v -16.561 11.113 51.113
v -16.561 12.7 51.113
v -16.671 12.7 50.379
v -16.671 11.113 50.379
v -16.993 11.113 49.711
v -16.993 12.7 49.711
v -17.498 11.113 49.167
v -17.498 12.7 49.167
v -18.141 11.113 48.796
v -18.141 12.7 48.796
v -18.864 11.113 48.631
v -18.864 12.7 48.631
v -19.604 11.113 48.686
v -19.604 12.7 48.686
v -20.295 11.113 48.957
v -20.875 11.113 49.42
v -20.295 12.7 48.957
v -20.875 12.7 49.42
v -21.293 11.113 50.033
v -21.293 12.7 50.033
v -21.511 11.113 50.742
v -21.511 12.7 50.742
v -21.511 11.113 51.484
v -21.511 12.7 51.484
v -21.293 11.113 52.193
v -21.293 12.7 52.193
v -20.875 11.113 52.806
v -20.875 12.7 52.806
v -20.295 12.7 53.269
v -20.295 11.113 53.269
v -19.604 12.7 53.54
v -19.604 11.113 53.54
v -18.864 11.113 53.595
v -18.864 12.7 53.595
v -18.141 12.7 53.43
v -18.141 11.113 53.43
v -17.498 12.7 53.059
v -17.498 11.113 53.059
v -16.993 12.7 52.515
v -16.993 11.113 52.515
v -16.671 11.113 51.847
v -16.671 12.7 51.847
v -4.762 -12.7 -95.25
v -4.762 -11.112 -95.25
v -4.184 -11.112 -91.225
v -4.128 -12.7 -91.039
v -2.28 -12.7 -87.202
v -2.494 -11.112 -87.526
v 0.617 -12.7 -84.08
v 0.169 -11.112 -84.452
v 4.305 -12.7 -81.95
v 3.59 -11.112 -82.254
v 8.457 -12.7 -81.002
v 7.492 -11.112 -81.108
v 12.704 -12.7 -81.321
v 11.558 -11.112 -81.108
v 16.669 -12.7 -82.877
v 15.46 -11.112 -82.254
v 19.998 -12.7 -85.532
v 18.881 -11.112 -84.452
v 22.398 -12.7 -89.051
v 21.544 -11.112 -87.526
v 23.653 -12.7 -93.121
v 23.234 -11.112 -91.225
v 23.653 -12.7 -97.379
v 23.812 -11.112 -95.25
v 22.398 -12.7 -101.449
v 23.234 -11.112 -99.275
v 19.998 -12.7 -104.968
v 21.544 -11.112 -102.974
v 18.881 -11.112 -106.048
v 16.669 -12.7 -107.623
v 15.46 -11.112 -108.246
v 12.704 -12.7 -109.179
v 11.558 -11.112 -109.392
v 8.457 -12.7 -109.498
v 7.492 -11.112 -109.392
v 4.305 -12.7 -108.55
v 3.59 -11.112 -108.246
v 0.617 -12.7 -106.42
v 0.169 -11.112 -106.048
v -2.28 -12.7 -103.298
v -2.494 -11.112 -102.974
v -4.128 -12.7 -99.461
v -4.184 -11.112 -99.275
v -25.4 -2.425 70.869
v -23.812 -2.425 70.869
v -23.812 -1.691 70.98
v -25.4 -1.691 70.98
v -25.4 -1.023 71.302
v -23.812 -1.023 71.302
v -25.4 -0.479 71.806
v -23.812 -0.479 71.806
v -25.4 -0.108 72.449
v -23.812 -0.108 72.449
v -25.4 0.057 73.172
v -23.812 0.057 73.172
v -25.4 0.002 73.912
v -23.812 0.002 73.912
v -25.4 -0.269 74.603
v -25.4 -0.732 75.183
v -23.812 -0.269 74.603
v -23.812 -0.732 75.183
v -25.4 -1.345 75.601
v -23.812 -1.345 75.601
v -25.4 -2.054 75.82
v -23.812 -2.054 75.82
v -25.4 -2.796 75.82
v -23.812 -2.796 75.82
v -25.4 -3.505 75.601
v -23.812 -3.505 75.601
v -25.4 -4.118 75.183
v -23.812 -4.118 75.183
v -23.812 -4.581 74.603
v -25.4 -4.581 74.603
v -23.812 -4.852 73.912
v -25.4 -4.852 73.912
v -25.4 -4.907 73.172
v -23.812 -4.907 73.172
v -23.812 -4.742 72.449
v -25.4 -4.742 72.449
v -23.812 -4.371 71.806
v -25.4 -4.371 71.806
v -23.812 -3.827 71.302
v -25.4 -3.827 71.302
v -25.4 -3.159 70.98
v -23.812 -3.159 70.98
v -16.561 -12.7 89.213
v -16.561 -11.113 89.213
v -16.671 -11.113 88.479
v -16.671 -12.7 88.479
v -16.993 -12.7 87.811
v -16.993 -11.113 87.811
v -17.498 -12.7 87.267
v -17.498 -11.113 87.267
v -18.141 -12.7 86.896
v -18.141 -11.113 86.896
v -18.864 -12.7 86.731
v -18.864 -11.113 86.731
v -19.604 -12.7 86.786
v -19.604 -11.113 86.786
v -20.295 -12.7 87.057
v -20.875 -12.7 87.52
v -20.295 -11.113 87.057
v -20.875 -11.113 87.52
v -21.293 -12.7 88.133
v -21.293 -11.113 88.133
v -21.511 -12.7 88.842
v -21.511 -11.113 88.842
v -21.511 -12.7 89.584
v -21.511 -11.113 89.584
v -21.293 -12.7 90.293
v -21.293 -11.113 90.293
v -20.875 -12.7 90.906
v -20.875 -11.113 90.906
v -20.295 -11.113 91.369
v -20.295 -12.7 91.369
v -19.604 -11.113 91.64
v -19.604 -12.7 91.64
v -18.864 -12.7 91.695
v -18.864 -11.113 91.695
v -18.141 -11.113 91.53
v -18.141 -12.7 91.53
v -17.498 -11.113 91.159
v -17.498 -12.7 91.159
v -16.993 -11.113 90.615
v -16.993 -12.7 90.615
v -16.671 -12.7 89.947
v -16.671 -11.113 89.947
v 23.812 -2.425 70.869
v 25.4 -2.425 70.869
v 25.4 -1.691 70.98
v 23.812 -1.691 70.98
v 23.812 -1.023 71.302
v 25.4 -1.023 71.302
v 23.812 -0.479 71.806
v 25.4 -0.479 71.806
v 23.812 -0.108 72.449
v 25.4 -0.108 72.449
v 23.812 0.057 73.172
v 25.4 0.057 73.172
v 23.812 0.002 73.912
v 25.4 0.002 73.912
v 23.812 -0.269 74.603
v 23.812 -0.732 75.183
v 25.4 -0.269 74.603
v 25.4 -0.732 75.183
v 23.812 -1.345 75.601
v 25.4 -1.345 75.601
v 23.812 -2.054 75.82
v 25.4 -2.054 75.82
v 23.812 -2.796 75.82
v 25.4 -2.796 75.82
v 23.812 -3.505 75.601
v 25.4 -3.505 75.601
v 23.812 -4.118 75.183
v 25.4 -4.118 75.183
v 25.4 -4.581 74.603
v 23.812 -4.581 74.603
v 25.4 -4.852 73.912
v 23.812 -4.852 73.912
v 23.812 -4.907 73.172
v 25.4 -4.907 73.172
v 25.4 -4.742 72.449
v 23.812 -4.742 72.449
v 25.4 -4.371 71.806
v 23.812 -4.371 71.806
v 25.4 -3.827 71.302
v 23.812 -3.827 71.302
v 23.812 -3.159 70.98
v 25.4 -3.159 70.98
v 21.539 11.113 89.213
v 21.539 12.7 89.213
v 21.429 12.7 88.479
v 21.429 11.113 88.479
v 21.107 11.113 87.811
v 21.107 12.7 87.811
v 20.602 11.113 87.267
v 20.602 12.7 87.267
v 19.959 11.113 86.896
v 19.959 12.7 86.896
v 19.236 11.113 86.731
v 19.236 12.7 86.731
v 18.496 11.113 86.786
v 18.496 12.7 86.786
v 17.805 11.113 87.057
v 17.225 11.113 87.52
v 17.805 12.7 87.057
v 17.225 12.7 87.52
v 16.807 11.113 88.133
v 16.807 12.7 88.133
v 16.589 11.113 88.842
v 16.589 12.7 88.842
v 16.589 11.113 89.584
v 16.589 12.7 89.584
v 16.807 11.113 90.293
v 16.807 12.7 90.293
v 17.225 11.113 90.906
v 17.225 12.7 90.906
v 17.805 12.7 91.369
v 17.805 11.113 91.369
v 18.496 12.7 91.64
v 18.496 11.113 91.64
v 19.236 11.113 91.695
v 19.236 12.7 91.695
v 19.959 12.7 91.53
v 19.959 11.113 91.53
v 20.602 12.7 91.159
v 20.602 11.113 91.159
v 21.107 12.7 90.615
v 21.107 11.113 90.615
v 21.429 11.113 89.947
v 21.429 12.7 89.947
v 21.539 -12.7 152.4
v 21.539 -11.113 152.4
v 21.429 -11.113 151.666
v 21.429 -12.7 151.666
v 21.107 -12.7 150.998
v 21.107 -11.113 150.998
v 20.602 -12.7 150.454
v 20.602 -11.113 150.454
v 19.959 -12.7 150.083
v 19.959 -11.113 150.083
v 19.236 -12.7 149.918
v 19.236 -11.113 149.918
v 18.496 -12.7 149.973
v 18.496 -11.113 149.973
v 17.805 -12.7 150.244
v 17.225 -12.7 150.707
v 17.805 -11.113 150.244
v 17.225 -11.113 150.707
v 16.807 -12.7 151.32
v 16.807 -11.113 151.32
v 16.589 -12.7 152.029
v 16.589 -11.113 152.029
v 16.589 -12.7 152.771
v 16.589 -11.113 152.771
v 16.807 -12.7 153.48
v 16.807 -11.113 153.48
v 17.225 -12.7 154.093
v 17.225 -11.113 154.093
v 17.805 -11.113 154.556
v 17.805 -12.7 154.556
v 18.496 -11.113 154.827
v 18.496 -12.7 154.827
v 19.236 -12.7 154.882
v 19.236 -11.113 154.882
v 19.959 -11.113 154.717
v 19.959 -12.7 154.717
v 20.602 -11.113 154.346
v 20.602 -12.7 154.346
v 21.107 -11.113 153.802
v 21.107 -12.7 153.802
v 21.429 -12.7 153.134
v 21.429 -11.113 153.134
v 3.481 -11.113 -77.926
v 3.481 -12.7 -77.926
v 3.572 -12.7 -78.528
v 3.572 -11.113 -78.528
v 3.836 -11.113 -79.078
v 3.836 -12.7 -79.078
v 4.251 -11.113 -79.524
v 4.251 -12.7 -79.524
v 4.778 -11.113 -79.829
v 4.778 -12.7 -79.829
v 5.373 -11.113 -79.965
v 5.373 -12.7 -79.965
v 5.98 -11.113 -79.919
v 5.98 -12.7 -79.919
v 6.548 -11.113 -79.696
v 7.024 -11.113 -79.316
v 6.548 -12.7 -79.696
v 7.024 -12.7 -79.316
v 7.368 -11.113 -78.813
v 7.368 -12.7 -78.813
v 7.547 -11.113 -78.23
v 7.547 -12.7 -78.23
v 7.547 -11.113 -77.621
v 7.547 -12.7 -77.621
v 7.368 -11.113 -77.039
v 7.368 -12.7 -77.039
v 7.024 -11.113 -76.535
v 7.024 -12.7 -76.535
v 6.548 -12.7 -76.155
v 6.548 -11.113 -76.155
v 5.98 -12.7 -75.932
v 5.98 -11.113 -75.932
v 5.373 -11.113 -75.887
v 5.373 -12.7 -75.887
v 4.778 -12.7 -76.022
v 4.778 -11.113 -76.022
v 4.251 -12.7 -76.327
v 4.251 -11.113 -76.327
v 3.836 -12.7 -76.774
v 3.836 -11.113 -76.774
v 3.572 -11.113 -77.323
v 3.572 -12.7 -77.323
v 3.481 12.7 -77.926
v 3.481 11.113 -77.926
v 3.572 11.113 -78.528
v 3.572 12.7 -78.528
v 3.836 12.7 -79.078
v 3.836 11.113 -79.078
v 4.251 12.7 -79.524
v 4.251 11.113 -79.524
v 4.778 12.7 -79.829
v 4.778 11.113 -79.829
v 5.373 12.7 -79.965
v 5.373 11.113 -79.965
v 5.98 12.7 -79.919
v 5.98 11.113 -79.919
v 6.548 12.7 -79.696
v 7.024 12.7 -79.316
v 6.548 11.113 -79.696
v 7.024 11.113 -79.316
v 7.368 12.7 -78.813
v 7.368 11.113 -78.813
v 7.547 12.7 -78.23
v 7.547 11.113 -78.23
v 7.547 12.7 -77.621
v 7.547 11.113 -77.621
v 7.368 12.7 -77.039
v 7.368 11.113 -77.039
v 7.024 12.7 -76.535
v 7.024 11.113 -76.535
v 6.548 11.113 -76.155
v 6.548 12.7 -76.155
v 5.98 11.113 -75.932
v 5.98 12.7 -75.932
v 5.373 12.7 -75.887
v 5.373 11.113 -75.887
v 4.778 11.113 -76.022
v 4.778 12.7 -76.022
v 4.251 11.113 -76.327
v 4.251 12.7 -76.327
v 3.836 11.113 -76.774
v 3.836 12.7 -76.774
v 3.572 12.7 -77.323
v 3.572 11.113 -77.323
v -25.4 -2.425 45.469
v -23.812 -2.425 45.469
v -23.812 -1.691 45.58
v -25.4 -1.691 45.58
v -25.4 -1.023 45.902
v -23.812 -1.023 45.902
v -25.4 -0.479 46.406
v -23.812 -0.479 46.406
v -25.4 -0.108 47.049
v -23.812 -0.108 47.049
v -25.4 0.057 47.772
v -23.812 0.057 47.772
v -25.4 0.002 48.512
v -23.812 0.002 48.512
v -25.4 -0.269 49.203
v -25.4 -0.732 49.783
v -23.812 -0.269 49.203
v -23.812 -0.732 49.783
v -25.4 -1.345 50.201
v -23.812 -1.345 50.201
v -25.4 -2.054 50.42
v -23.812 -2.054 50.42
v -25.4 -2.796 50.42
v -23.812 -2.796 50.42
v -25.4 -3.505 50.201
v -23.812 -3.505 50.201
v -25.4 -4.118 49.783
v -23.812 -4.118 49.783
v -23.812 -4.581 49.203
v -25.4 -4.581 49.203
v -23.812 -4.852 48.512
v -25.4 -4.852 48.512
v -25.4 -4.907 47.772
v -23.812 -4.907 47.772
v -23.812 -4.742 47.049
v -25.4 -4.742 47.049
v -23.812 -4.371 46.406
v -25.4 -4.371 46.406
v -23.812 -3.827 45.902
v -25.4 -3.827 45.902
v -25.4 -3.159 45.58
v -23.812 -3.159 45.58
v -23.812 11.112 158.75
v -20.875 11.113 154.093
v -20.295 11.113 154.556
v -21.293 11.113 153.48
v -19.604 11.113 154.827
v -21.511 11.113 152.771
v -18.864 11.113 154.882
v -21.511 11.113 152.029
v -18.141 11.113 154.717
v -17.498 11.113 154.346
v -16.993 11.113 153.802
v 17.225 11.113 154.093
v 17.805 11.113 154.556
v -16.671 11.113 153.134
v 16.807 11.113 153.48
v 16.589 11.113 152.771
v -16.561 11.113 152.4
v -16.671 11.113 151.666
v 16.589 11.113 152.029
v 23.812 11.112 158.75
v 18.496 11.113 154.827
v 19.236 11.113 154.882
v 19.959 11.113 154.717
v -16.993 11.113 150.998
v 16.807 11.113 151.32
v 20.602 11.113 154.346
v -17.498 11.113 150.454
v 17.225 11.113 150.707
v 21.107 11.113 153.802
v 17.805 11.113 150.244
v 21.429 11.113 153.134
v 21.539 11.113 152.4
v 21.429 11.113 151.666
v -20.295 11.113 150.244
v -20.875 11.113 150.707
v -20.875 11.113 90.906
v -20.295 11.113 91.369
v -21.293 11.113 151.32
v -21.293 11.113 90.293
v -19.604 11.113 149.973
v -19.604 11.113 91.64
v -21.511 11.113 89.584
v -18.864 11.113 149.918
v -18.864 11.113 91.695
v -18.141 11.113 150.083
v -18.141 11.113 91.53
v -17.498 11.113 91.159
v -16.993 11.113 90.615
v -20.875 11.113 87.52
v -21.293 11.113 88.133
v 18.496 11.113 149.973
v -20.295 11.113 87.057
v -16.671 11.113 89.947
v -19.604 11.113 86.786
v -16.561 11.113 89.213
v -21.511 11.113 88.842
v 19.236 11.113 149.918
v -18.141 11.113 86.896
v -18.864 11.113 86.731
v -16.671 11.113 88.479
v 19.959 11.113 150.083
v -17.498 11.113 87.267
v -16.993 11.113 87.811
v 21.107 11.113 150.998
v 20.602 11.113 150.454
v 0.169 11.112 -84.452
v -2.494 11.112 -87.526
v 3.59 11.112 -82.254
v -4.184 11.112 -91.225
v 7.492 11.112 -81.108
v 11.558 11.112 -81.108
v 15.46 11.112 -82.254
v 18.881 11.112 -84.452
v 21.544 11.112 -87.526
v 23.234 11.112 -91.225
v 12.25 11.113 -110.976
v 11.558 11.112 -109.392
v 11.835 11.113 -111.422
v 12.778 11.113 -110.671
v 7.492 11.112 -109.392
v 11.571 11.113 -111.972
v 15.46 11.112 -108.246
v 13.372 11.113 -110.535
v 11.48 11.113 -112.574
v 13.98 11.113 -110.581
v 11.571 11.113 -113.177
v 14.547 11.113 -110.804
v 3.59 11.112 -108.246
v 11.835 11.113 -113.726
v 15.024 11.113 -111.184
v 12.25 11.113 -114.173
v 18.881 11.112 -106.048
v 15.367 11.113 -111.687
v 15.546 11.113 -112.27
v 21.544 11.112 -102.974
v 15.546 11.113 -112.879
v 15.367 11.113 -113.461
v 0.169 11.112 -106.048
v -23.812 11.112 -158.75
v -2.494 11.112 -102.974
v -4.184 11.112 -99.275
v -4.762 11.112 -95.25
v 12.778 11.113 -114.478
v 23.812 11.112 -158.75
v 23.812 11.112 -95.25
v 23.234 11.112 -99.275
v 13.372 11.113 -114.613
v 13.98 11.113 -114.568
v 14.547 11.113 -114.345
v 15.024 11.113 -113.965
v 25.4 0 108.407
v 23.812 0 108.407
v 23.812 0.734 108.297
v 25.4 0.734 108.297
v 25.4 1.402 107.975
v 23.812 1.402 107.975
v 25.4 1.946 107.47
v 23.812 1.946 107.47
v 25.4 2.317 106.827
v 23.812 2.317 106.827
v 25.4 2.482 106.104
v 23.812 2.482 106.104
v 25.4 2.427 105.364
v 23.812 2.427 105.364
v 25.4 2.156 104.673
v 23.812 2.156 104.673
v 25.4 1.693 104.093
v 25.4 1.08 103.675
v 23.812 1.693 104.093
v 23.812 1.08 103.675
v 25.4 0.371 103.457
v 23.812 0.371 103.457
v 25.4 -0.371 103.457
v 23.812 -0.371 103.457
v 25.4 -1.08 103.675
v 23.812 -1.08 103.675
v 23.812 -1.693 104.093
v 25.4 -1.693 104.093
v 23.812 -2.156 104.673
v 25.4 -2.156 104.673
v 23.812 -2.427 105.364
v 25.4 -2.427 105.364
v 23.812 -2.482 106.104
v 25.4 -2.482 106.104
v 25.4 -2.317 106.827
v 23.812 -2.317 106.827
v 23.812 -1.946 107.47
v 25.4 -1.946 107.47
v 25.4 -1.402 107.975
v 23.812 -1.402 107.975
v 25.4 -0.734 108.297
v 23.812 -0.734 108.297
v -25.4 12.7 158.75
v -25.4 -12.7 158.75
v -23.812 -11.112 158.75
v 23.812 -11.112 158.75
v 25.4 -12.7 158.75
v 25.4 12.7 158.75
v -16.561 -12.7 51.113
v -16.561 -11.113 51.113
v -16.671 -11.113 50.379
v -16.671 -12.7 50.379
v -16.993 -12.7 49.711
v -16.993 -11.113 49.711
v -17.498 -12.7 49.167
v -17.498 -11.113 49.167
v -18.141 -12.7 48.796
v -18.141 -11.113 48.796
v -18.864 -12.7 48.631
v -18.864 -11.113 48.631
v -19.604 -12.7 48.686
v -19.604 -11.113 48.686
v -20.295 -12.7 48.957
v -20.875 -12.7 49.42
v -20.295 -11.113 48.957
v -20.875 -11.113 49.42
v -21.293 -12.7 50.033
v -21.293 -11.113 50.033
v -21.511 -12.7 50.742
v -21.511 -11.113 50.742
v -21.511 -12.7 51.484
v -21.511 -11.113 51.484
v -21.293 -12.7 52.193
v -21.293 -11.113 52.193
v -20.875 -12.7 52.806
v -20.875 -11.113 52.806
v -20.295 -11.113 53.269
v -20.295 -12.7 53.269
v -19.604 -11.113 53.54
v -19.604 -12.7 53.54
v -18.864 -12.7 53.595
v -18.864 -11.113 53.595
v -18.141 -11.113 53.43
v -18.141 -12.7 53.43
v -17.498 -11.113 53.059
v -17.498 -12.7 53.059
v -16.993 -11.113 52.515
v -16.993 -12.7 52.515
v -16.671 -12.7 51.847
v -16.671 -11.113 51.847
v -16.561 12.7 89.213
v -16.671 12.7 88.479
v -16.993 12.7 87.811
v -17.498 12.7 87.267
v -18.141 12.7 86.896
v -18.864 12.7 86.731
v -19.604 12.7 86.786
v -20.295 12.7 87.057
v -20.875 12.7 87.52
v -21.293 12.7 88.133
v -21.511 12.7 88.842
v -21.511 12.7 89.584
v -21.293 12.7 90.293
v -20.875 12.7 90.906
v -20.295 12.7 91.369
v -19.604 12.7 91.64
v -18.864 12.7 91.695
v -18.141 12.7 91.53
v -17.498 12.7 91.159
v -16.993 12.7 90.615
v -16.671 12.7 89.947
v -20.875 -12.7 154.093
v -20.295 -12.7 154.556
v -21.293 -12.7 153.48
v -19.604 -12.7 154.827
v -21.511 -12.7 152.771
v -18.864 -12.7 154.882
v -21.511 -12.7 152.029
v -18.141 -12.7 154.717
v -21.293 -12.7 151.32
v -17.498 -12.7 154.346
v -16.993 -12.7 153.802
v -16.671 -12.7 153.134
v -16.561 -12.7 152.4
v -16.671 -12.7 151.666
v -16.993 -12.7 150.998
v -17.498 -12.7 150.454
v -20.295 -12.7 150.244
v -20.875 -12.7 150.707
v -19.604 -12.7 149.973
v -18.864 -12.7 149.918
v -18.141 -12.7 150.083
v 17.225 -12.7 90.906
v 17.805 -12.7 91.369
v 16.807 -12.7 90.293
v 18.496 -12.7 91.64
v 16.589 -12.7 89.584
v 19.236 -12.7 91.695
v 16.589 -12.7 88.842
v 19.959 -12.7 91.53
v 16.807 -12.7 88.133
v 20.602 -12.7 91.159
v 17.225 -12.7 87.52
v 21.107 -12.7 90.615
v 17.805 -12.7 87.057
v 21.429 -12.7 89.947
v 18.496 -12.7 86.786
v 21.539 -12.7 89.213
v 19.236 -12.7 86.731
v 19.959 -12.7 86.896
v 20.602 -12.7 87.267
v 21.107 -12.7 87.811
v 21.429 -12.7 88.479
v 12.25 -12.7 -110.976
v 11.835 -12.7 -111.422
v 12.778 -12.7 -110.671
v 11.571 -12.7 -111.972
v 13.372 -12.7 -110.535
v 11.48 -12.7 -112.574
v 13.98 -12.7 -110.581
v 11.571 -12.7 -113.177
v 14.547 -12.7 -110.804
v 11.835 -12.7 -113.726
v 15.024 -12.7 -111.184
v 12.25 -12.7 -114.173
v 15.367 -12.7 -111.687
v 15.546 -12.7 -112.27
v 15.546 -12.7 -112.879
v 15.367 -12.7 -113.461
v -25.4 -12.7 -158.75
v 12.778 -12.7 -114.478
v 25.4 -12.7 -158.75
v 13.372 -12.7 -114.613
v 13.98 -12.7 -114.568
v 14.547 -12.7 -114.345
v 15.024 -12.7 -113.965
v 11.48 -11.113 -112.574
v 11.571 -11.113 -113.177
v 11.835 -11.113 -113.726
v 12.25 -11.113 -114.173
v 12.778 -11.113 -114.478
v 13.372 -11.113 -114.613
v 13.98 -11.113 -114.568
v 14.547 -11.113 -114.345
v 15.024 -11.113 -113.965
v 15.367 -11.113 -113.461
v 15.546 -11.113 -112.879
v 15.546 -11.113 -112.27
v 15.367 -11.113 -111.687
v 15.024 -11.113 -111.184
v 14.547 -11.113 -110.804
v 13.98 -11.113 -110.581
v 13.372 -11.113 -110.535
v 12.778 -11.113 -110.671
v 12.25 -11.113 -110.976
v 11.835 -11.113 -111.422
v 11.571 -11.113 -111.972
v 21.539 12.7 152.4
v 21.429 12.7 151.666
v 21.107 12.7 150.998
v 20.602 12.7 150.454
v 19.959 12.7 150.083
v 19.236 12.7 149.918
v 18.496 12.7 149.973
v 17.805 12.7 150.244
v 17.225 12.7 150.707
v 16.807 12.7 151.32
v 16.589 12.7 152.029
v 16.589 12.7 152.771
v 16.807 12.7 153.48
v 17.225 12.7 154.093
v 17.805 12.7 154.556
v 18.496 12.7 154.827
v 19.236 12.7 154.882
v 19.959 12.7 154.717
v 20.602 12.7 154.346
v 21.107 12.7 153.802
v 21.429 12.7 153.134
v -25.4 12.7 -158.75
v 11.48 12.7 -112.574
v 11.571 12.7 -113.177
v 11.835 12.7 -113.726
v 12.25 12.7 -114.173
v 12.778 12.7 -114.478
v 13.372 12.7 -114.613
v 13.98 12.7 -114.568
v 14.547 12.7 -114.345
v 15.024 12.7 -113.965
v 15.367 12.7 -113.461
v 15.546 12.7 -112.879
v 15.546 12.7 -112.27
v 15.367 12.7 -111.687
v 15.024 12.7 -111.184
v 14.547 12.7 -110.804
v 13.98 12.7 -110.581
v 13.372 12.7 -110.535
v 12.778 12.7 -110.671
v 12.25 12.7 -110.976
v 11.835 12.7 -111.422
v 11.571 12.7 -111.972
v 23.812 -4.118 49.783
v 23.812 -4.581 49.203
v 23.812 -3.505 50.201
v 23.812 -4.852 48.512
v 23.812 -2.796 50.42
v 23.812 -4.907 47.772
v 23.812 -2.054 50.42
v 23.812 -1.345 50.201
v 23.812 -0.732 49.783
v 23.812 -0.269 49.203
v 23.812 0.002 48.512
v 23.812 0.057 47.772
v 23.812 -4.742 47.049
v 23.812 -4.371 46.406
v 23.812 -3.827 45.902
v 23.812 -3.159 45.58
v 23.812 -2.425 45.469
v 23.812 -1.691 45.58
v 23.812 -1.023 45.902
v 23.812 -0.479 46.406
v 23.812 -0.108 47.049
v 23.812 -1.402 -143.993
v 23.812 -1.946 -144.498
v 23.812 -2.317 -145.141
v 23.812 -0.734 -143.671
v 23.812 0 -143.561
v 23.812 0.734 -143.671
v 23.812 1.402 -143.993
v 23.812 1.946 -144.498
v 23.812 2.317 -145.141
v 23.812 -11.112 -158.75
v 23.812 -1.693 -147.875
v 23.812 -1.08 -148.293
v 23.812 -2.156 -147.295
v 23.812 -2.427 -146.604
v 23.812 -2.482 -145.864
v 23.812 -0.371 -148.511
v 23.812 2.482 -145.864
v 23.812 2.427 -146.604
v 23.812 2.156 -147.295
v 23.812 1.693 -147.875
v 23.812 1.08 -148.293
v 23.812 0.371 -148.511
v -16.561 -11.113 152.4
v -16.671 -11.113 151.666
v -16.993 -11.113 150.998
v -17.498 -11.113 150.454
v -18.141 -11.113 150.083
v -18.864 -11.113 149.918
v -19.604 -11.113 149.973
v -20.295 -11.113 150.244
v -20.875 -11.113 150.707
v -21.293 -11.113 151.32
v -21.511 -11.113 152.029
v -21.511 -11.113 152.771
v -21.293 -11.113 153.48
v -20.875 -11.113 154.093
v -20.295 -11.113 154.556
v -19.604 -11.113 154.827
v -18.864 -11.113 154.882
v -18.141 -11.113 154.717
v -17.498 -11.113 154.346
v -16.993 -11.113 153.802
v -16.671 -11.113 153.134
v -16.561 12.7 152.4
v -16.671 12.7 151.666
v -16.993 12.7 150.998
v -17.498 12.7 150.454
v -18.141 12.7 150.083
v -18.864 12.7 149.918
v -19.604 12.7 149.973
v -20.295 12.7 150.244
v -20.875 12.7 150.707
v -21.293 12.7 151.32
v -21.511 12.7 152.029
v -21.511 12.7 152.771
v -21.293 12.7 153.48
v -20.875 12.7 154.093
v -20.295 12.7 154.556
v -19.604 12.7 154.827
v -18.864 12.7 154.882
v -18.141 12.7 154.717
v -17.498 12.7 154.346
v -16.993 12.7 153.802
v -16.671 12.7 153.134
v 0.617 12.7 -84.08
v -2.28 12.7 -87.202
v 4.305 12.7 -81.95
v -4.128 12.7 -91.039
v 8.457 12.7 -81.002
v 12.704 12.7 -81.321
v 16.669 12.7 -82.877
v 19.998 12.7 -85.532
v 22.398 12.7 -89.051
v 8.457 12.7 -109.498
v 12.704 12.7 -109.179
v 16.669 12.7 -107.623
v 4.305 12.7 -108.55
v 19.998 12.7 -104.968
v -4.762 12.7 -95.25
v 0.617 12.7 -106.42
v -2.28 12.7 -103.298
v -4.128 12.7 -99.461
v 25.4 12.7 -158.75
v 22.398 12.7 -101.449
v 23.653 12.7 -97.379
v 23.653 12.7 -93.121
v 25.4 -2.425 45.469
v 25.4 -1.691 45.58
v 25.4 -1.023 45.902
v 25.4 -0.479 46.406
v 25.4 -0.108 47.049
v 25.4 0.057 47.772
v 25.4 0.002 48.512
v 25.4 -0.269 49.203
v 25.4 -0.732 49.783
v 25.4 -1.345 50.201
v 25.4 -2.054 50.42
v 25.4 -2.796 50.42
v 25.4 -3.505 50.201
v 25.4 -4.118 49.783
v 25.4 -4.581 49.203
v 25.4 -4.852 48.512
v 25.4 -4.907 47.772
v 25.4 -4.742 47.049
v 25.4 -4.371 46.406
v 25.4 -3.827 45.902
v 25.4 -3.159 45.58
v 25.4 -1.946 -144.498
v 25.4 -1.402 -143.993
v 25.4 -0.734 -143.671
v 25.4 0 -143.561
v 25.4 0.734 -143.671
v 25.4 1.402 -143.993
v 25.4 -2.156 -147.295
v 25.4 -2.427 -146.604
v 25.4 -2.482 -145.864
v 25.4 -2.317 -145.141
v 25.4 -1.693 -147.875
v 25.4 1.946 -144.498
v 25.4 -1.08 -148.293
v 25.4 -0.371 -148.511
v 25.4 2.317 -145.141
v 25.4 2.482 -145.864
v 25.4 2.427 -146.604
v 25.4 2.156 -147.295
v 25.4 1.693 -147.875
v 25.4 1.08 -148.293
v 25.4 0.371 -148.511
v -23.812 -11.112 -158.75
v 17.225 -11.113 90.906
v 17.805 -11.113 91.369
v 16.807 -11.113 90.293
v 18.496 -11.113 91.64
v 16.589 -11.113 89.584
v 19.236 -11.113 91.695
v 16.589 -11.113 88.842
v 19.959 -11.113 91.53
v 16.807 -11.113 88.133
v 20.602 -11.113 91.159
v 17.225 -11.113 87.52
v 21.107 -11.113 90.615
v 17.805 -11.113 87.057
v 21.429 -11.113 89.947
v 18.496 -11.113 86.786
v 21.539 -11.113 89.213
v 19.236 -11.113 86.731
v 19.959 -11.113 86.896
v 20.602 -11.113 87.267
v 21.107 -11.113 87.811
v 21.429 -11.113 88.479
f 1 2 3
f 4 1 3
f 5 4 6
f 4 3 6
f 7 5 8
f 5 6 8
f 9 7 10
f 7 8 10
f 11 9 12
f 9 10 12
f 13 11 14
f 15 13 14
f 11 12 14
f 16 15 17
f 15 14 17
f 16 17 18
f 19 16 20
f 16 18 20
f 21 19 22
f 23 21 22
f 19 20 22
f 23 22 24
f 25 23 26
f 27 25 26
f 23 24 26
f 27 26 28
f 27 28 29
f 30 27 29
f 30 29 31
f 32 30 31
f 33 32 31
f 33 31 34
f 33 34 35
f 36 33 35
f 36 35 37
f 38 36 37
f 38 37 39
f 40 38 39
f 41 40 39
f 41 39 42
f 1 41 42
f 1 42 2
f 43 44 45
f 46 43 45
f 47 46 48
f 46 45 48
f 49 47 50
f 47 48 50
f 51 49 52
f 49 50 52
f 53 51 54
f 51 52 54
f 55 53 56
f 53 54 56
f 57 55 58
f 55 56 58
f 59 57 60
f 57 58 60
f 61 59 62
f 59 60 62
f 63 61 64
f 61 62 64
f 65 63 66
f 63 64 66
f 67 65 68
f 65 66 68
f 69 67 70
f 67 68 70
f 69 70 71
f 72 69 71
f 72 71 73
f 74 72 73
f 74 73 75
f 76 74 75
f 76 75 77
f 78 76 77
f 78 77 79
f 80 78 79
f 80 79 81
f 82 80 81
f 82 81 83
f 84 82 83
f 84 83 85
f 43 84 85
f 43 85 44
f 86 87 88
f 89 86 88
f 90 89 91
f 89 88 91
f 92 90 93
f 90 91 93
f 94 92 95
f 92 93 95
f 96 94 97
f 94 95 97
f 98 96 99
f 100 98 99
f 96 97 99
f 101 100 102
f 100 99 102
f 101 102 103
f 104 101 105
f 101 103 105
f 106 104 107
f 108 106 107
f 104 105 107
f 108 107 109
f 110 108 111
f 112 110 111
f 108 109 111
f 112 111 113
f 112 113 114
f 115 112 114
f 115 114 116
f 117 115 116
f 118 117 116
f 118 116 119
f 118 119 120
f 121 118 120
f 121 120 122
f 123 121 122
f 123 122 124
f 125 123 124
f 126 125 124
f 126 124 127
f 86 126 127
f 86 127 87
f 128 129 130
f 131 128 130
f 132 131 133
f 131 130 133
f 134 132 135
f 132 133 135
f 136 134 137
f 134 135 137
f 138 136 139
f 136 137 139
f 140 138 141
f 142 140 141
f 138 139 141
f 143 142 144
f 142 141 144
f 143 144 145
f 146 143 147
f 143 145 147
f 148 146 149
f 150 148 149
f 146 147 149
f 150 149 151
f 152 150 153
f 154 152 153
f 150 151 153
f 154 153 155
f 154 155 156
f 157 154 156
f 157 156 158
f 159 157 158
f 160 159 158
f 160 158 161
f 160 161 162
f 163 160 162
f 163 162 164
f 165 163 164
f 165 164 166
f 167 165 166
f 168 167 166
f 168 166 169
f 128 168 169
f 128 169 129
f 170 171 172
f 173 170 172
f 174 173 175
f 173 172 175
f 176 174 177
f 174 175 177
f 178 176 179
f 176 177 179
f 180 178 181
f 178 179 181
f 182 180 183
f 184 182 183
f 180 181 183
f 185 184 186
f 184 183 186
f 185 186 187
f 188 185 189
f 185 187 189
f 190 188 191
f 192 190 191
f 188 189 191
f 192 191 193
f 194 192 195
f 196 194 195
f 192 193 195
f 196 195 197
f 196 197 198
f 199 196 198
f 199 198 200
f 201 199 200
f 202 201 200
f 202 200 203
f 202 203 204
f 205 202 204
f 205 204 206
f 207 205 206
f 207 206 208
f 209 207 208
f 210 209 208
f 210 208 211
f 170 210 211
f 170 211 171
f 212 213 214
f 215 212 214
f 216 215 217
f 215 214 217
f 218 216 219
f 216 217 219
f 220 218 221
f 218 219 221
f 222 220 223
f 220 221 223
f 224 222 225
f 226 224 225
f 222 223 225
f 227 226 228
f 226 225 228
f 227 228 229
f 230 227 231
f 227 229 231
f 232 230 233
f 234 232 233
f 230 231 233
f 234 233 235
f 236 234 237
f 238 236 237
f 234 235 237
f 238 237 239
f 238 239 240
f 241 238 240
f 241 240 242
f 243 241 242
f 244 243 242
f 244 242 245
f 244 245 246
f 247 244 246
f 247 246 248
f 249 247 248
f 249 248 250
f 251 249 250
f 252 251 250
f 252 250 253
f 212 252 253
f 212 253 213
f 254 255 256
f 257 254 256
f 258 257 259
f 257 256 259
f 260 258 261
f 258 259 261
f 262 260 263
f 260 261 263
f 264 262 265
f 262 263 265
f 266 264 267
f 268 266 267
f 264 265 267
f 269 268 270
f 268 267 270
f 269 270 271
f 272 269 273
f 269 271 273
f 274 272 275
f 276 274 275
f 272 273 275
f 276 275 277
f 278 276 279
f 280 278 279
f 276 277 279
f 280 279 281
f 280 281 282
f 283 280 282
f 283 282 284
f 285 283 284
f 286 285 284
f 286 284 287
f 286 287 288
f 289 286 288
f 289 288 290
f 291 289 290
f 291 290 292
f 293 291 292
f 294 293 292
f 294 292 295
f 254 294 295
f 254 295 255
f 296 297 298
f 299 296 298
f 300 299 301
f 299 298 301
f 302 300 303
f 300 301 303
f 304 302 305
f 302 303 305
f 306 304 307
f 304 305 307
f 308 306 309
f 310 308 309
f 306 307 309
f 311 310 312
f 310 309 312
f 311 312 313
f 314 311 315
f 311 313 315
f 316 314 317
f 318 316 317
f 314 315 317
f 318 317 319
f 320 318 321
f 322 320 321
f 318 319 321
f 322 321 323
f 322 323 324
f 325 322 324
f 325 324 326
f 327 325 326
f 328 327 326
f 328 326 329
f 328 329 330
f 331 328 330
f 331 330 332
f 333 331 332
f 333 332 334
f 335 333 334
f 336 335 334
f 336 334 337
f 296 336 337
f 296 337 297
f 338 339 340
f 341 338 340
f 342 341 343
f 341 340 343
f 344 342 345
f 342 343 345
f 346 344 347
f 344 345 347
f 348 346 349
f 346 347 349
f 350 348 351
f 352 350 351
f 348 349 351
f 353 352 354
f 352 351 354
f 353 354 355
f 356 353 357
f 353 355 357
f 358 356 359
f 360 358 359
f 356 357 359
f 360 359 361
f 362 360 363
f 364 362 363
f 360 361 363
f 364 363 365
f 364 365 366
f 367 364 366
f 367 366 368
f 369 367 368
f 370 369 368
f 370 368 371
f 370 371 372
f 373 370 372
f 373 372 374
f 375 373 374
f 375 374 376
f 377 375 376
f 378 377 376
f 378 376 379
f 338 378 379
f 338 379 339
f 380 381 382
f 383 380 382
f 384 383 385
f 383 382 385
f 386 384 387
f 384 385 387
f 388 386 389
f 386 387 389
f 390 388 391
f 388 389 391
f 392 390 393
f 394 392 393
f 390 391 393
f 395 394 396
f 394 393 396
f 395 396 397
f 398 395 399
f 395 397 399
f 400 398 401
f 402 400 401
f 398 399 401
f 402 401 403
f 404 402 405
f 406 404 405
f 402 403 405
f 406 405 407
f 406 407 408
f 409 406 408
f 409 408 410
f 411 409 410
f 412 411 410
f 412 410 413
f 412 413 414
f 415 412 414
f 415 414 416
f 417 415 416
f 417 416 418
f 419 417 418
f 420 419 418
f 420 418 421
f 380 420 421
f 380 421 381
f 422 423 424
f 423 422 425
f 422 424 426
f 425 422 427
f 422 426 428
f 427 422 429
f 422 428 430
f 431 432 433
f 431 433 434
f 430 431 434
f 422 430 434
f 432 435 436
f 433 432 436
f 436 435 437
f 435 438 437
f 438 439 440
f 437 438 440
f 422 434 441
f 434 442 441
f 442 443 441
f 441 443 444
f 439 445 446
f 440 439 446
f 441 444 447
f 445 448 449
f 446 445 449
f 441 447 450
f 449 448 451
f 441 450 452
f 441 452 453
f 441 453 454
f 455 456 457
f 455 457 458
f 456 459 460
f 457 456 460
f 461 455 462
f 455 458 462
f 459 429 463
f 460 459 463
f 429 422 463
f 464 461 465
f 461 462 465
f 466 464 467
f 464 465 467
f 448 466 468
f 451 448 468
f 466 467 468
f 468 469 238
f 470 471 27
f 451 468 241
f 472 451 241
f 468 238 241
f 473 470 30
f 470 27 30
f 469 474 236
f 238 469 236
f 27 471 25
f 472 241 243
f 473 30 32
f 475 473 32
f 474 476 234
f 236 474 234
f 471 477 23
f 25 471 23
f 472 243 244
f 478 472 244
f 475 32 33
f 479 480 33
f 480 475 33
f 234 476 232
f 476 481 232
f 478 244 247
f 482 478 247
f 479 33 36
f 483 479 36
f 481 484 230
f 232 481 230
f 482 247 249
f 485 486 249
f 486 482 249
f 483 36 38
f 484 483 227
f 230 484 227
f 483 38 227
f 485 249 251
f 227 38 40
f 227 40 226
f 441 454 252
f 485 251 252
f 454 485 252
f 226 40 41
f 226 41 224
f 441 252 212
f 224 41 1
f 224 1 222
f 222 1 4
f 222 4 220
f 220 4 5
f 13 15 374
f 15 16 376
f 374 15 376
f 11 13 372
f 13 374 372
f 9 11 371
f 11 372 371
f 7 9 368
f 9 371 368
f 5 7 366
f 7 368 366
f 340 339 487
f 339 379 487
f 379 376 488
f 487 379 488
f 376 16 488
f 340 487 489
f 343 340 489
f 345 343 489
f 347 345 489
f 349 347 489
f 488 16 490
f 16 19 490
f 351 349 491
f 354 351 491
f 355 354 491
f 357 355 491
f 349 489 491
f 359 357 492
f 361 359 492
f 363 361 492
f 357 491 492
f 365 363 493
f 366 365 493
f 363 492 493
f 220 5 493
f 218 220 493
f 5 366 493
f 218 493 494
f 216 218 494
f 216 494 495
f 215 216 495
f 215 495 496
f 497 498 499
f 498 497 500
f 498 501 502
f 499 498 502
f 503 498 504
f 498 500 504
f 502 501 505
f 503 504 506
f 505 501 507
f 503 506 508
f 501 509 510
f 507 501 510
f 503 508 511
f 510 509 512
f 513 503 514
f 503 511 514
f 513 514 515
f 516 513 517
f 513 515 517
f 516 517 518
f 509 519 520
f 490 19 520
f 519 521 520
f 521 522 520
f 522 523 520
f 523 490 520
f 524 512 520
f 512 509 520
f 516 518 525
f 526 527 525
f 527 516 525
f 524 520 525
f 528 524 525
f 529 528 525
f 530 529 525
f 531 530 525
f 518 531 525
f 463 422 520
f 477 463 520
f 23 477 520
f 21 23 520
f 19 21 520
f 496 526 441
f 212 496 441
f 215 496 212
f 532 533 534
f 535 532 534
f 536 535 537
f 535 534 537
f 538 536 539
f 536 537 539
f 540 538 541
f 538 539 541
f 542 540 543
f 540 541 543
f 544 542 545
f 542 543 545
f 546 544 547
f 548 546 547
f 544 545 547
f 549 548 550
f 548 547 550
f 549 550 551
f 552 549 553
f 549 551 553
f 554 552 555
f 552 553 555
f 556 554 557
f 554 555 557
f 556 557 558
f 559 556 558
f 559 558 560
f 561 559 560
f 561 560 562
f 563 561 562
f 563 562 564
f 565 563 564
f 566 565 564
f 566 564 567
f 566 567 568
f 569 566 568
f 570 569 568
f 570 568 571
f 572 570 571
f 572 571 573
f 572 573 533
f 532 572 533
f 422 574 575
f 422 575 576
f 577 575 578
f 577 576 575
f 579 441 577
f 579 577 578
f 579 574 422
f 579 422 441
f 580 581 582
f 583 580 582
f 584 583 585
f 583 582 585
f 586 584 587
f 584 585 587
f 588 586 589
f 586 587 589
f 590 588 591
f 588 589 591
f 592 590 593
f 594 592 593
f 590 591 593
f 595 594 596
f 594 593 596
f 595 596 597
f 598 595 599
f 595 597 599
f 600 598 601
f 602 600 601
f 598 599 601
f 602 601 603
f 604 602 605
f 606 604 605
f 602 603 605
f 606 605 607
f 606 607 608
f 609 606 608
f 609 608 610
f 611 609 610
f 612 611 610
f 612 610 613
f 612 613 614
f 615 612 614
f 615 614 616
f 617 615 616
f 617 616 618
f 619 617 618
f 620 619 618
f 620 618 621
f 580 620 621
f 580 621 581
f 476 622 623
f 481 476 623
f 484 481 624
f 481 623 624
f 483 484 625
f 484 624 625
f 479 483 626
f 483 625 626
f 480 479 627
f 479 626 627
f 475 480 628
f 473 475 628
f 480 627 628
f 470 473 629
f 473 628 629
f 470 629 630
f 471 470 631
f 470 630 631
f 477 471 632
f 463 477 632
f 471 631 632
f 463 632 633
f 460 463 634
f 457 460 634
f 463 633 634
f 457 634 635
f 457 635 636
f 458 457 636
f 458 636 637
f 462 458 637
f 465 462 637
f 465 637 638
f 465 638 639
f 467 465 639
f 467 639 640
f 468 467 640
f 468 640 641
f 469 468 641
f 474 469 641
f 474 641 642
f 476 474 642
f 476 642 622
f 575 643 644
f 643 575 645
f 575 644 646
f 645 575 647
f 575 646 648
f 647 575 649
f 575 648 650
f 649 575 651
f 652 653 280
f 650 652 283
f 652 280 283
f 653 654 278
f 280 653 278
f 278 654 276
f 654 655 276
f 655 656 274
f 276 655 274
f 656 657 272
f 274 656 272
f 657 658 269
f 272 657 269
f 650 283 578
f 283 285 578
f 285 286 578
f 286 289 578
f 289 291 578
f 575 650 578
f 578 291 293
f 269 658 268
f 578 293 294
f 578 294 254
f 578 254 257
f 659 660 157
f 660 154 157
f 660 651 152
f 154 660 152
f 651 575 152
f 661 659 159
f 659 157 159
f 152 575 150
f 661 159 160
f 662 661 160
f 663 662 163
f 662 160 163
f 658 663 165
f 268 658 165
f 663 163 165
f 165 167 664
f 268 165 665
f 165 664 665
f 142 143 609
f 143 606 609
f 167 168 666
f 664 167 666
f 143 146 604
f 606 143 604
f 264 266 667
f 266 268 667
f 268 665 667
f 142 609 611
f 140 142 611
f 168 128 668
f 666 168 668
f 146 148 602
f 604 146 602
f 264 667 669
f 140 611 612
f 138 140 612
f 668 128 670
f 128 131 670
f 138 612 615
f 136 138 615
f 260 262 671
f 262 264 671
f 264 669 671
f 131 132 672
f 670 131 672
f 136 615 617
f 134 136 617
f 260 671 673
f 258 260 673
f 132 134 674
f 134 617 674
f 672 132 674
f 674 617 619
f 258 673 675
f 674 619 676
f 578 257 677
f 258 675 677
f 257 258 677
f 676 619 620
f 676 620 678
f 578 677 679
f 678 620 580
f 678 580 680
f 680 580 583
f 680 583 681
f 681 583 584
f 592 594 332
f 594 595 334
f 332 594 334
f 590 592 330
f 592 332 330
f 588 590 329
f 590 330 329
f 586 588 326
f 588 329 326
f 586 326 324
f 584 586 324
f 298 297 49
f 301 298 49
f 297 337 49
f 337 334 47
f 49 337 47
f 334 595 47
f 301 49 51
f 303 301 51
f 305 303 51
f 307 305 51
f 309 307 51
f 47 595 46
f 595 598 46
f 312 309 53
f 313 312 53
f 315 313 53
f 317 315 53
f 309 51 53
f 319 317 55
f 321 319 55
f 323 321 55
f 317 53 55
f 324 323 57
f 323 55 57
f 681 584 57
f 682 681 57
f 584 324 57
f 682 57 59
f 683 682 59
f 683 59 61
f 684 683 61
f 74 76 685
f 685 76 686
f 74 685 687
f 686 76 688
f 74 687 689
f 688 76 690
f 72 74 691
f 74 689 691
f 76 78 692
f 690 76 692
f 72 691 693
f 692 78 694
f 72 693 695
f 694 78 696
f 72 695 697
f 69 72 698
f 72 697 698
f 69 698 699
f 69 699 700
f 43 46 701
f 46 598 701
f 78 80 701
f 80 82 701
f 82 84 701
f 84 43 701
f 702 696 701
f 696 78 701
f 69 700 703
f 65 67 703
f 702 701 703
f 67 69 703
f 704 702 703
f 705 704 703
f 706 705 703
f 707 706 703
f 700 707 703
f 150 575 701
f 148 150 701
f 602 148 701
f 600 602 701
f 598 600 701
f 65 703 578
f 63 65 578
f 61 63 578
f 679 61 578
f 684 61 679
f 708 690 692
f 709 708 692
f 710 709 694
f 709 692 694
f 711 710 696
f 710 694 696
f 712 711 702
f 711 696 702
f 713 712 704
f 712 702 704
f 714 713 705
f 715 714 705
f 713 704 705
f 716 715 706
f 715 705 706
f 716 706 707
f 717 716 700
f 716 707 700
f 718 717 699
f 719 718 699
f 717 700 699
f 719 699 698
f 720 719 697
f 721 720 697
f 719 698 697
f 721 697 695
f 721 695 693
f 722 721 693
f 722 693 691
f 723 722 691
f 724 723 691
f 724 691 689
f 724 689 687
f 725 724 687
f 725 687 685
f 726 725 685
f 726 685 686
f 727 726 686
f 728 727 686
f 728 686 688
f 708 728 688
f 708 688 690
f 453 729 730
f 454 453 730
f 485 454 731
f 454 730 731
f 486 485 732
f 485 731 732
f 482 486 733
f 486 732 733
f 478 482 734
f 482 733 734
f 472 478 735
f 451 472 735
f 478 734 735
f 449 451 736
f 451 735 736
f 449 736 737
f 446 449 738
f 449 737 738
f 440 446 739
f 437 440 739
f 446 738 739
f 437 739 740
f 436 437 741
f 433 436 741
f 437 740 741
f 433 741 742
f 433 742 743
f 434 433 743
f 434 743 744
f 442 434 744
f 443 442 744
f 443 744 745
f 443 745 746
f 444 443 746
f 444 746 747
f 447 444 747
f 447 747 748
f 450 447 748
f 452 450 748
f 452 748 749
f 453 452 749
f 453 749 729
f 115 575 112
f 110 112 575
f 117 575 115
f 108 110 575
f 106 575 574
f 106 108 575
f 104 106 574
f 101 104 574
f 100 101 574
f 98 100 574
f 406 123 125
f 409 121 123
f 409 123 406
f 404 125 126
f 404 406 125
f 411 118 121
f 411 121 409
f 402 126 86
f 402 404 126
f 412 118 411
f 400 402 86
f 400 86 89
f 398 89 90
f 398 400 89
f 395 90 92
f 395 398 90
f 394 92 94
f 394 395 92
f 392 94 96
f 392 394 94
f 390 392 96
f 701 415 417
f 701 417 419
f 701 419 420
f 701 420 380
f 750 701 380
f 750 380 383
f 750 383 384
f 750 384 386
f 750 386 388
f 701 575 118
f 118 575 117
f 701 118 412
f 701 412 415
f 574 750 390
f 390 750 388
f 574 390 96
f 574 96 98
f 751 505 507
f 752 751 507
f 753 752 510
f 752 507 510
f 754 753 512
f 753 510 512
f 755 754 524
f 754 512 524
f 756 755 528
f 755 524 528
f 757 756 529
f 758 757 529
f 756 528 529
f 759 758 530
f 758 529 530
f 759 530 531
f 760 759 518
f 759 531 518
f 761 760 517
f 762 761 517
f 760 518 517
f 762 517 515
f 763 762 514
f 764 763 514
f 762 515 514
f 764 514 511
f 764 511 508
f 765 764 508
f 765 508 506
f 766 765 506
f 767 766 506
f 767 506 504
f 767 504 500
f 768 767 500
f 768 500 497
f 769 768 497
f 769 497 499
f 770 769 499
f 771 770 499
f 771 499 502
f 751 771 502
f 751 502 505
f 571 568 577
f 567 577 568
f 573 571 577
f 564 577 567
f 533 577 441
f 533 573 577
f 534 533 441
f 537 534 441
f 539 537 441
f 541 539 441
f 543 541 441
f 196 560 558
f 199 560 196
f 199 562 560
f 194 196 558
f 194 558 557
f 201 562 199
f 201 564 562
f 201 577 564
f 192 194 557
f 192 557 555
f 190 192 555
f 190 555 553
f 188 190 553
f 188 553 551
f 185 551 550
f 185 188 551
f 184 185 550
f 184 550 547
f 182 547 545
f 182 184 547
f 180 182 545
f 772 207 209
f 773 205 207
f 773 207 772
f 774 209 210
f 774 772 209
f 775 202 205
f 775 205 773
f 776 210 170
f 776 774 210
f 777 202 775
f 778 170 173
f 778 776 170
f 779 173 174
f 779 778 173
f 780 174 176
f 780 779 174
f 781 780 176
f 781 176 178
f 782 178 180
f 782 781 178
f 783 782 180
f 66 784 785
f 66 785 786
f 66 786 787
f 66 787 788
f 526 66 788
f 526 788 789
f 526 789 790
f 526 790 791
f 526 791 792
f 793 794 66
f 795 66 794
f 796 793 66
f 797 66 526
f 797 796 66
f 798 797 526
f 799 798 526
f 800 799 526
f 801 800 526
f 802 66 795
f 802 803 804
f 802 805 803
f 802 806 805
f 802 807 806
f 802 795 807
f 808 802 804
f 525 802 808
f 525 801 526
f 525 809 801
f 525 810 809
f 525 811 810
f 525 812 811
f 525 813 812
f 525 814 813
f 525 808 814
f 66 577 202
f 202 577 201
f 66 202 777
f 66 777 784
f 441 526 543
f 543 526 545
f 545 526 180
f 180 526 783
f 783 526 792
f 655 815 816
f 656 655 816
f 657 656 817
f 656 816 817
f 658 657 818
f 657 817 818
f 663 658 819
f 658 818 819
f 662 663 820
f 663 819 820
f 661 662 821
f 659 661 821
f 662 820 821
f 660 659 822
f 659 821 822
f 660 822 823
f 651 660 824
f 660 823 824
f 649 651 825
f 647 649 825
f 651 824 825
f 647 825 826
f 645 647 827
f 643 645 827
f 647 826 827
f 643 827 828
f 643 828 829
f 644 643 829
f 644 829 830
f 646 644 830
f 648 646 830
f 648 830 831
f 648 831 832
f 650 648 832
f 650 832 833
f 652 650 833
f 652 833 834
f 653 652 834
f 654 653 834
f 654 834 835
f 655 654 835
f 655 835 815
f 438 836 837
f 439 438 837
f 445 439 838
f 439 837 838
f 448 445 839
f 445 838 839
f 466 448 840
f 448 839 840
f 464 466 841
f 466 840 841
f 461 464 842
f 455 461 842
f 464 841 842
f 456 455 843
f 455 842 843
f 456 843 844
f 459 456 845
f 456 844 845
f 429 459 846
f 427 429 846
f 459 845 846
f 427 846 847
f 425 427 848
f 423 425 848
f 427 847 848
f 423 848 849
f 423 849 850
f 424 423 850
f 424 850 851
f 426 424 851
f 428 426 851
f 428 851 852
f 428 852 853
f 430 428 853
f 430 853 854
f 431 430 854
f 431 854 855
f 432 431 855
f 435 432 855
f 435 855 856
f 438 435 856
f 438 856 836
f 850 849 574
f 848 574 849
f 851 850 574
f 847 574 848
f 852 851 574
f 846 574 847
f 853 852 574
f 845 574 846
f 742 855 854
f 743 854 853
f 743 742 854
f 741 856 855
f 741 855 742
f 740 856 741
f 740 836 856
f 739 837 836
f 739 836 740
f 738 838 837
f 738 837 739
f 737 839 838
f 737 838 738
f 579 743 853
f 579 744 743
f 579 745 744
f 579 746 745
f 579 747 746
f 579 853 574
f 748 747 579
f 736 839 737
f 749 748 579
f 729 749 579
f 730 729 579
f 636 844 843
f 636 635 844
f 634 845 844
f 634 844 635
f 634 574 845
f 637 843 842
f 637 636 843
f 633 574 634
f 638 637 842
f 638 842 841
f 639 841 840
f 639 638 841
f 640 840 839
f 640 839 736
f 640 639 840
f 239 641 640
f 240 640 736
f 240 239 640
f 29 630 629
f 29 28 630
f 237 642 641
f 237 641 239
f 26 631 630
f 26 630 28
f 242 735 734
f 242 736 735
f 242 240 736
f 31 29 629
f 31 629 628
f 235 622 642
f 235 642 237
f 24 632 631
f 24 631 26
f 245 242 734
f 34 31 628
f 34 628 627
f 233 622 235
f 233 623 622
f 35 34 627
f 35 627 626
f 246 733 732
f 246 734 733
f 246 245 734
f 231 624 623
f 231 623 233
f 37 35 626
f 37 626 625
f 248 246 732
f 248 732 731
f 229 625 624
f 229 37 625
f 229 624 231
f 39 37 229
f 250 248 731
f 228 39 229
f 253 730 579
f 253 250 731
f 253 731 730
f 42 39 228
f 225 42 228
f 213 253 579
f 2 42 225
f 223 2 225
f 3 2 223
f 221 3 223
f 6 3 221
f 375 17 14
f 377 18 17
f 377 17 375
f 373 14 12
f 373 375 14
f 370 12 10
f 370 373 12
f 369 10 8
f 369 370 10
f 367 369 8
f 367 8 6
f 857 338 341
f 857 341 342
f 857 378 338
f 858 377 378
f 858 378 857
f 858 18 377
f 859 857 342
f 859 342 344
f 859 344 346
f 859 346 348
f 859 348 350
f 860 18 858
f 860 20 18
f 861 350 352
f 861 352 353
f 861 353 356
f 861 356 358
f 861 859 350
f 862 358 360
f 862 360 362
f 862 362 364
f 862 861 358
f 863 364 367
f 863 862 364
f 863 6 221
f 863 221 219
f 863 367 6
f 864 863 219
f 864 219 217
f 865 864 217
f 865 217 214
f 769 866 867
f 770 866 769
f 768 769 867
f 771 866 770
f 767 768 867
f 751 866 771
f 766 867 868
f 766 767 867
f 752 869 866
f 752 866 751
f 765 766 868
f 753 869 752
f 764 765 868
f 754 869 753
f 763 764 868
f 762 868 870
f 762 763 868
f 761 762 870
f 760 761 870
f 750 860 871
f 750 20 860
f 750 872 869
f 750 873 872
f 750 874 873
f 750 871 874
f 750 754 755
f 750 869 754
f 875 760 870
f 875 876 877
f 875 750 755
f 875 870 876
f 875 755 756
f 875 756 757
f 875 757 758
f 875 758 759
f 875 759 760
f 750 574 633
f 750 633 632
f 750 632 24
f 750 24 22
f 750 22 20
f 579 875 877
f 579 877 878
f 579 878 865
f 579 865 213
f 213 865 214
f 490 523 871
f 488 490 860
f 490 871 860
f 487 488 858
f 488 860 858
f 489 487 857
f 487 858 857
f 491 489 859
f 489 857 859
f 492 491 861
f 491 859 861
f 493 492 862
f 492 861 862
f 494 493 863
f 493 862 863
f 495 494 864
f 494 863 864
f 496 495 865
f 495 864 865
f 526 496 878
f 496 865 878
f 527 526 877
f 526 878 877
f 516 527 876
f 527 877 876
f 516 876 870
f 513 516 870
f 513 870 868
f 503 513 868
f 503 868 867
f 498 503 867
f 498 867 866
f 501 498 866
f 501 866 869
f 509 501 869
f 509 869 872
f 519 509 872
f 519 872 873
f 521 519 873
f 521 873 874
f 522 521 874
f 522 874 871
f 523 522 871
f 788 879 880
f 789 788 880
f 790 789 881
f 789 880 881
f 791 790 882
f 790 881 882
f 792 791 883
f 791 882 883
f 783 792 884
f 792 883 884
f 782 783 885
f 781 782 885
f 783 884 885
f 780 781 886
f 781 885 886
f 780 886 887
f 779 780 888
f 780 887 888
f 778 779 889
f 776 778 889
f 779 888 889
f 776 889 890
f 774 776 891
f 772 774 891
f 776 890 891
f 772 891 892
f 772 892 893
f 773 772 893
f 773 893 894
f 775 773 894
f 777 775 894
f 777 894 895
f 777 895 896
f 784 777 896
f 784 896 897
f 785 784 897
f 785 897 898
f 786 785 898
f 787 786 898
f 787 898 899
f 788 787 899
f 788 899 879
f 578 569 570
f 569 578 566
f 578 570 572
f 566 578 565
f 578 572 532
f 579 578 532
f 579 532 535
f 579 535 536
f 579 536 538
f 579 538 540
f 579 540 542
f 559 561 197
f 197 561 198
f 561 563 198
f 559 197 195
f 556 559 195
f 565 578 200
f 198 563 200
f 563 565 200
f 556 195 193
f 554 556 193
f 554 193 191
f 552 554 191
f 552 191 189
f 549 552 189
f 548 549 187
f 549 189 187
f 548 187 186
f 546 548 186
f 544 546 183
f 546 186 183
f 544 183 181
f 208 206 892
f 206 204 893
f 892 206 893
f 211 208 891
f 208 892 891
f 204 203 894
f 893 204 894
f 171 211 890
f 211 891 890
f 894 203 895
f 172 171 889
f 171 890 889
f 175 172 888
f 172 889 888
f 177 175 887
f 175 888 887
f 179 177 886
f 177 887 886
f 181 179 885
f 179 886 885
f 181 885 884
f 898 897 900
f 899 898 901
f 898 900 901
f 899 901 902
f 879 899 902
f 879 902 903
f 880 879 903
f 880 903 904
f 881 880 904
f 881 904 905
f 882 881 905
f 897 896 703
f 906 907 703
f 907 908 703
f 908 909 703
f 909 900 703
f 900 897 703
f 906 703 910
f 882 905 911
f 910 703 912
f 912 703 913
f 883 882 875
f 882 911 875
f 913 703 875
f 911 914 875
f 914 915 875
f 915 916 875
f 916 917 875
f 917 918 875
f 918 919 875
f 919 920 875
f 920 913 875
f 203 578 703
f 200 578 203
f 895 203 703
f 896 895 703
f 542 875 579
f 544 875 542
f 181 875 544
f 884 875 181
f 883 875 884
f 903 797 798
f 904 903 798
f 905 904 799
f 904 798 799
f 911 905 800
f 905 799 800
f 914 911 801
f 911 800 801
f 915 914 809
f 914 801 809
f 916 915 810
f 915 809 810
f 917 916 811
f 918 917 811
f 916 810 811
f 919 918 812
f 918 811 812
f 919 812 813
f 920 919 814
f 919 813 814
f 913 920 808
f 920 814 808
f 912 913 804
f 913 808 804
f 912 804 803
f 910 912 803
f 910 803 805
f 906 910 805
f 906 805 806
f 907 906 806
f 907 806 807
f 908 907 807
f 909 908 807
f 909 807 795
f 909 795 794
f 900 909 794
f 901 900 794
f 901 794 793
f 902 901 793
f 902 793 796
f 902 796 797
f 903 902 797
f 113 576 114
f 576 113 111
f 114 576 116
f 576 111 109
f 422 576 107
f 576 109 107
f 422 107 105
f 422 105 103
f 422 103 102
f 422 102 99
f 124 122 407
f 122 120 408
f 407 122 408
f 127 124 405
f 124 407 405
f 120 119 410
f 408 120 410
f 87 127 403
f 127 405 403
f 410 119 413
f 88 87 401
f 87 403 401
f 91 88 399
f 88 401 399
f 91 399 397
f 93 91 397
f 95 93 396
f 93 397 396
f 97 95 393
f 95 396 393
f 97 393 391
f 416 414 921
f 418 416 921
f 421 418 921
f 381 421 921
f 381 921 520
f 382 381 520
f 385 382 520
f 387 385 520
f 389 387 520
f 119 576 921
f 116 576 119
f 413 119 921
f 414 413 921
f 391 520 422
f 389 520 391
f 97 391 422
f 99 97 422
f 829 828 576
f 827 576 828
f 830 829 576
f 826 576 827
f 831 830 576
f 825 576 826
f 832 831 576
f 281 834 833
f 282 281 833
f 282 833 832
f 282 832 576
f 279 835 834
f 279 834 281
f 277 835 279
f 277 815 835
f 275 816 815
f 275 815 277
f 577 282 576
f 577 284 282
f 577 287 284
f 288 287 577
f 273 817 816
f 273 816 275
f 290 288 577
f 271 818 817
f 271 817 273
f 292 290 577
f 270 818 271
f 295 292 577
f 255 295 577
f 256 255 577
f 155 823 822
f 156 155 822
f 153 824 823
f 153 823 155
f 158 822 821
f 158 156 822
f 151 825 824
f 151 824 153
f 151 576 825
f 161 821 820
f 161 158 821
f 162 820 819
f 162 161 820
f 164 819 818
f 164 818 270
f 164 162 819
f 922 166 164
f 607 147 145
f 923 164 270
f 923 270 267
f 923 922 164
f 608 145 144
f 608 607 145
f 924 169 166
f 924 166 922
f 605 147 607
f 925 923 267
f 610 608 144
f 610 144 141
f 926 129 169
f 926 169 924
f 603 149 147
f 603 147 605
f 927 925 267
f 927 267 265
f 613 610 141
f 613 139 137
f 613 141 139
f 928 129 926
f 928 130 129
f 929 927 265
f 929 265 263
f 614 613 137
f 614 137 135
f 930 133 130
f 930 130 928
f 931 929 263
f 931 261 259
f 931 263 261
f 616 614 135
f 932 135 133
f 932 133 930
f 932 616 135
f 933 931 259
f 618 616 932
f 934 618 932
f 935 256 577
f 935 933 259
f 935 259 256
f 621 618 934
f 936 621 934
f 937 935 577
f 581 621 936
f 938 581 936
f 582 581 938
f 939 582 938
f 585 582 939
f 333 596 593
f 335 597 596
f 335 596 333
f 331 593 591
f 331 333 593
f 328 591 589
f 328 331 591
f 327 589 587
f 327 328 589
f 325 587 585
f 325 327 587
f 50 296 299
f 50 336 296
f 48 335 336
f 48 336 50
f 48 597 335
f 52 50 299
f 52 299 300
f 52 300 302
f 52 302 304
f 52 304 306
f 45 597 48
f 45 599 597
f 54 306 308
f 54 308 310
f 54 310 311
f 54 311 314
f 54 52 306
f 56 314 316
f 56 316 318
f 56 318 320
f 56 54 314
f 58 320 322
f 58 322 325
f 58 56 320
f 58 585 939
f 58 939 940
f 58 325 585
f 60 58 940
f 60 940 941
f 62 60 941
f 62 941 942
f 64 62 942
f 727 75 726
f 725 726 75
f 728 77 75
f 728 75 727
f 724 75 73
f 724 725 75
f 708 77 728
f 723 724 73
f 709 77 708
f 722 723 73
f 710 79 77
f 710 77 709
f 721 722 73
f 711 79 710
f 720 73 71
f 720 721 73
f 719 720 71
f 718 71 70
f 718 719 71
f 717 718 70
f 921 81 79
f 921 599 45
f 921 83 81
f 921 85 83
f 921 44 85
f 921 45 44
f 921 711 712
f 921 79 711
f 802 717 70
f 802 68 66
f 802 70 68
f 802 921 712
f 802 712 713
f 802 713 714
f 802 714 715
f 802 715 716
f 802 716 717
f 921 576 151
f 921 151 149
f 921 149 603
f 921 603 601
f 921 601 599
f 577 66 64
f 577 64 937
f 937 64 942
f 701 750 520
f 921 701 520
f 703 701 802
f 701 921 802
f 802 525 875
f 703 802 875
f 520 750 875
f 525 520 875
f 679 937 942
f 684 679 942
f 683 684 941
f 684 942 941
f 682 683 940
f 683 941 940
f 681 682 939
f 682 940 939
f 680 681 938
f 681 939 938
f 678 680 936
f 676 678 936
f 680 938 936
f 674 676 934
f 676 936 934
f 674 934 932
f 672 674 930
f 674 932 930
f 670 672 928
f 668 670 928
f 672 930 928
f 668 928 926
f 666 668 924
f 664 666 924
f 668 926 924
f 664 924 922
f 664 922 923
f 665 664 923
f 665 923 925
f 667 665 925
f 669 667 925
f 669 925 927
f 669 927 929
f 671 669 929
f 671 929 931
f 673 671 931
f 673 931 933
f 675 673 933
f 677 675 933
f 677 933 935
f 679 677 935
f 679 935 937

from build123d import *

# Parameters (mm, degrees)
BOSS_EXTRUDE1_DEPTH         = 158.750001
BOSS_EXTRUDE1_DEPTH_BACK    = 158.750001
SKETCH3_W                   = 50.8
SKETCH3_H                   = 25.4
SKETCH3_W_2                 = 47.625
SKETCH3_H_2                 = 22.225
SKETCH4_R                   = 14.2875
CUT_EXTRUDE1_DEPTH          = 39.37
F_10_CLEARANCE_HOLE1_D      = 4.9784
F_10_CLEARANCE_HOLE2_D      = 4.9784
F_20_0_161_DIAMETER_HOLE1_D = 4.0894
F_10_CLEARANCE_HOLE3_D      = 4.9784
F_10_CLEARANCE_HOLE3_DEPTH  = 12.7
F_10_CLEARANCE_HOLE3_TIP    = 1.495662253


with BuildPart() as part:
    # Sketch3 → Boss-Extrude1 (new, two sides: drawn at the far end of the back side and taken through both)
    with BuildSketch(Plane.XY.offset(-BOSS_EXTRUDE1_DEPTH_BACK)):
        Rectangle(SKETCH3_W, SKETCH3_H)
        Rectangle(SKETCH3_W_2, SKETCH3_H_2, mode=Mode.SUBTRACT)
    extrude(amount=BOSS_EXTRUDE1_DEPTH + BOSS_EXTRUDE1_DEPTH_BACK)

    # Sketch4 → Cut-Extrude1 (cut)
    with BuildSketch(Plane(origin=(0, 12.7, 0), x_dir=(1, 0, 0), z_dir=(0, 1, 0))):
        with Locations(Location((9.525, 95.250000508, 0), (0, 0, 180))):
            Circle(SKETCH4_R)
    extrude(amount=-CUT_EXTRUDE1_DEPTH, mode=Mode.SUBTRACT)

    # #10 Clearance Hole1 (through all)
    with Locations(Plane.ZY.offset(25.4)):
        with Locations((73.358188649, -2.425), (47.958188649, -2.425)):
            Hole(F_10_CLEARANCE_HOLE1_D / 2)

    # #10 Clearance Hole2 (through all)
    with Locations(Plane(origin=(0, -12.7, 0), x_dir=(-1, 0, 0), z_dir=(0, -1, 0))):
        with Locations((19.05, -51.113080493), (19.05, -89.213080493), (-19.05, -89.213080493), (-19.05, -152.400000508), (19.05, -152.400000508)):
            Hole(F_10_CLEARANCE_HOLE2_D / 2)

    # #20 (0.161) Diameter Hole1 (through all)
    with Locations(Plane(origin=(0, 12.7, 0), x_dir=(1, 0, 0), z_dir=(0, 1, 0))):
        with Locations((13.524629742, 112.574300261), (5.525370258, 77.925700755)):
            Hole(F_20_0_161_DIAMETER_HOLE1_D / 2)

    # #10 Clearance Hole3
    with Locations(Plane(origin=(25.4, 0, 0), x_dir=(0, 0, -1), z_dir=(1, 0, 0))):
        with Locations((-105.917999492, 0), (146.050000508, 0)):
            Hole(F_10_CLEARANCE_HOLE3_D / 2, depth=F_10_CLEARANCE_HOLE3_DEPTH)
            with Locations((0, 0, -(F_10_CLEARANCE_HOLE3_DEPTH + F_10_CLEARANCE_HOLE3_TIP / 2))):  # 118° drill point
                Cone(0, F_10_CLEARANCE_HOLE3_D / 2, F_10_CLEARANCE_HOLE3_TIP, mode=Mode.SUBTRACT)


solid = part.part
